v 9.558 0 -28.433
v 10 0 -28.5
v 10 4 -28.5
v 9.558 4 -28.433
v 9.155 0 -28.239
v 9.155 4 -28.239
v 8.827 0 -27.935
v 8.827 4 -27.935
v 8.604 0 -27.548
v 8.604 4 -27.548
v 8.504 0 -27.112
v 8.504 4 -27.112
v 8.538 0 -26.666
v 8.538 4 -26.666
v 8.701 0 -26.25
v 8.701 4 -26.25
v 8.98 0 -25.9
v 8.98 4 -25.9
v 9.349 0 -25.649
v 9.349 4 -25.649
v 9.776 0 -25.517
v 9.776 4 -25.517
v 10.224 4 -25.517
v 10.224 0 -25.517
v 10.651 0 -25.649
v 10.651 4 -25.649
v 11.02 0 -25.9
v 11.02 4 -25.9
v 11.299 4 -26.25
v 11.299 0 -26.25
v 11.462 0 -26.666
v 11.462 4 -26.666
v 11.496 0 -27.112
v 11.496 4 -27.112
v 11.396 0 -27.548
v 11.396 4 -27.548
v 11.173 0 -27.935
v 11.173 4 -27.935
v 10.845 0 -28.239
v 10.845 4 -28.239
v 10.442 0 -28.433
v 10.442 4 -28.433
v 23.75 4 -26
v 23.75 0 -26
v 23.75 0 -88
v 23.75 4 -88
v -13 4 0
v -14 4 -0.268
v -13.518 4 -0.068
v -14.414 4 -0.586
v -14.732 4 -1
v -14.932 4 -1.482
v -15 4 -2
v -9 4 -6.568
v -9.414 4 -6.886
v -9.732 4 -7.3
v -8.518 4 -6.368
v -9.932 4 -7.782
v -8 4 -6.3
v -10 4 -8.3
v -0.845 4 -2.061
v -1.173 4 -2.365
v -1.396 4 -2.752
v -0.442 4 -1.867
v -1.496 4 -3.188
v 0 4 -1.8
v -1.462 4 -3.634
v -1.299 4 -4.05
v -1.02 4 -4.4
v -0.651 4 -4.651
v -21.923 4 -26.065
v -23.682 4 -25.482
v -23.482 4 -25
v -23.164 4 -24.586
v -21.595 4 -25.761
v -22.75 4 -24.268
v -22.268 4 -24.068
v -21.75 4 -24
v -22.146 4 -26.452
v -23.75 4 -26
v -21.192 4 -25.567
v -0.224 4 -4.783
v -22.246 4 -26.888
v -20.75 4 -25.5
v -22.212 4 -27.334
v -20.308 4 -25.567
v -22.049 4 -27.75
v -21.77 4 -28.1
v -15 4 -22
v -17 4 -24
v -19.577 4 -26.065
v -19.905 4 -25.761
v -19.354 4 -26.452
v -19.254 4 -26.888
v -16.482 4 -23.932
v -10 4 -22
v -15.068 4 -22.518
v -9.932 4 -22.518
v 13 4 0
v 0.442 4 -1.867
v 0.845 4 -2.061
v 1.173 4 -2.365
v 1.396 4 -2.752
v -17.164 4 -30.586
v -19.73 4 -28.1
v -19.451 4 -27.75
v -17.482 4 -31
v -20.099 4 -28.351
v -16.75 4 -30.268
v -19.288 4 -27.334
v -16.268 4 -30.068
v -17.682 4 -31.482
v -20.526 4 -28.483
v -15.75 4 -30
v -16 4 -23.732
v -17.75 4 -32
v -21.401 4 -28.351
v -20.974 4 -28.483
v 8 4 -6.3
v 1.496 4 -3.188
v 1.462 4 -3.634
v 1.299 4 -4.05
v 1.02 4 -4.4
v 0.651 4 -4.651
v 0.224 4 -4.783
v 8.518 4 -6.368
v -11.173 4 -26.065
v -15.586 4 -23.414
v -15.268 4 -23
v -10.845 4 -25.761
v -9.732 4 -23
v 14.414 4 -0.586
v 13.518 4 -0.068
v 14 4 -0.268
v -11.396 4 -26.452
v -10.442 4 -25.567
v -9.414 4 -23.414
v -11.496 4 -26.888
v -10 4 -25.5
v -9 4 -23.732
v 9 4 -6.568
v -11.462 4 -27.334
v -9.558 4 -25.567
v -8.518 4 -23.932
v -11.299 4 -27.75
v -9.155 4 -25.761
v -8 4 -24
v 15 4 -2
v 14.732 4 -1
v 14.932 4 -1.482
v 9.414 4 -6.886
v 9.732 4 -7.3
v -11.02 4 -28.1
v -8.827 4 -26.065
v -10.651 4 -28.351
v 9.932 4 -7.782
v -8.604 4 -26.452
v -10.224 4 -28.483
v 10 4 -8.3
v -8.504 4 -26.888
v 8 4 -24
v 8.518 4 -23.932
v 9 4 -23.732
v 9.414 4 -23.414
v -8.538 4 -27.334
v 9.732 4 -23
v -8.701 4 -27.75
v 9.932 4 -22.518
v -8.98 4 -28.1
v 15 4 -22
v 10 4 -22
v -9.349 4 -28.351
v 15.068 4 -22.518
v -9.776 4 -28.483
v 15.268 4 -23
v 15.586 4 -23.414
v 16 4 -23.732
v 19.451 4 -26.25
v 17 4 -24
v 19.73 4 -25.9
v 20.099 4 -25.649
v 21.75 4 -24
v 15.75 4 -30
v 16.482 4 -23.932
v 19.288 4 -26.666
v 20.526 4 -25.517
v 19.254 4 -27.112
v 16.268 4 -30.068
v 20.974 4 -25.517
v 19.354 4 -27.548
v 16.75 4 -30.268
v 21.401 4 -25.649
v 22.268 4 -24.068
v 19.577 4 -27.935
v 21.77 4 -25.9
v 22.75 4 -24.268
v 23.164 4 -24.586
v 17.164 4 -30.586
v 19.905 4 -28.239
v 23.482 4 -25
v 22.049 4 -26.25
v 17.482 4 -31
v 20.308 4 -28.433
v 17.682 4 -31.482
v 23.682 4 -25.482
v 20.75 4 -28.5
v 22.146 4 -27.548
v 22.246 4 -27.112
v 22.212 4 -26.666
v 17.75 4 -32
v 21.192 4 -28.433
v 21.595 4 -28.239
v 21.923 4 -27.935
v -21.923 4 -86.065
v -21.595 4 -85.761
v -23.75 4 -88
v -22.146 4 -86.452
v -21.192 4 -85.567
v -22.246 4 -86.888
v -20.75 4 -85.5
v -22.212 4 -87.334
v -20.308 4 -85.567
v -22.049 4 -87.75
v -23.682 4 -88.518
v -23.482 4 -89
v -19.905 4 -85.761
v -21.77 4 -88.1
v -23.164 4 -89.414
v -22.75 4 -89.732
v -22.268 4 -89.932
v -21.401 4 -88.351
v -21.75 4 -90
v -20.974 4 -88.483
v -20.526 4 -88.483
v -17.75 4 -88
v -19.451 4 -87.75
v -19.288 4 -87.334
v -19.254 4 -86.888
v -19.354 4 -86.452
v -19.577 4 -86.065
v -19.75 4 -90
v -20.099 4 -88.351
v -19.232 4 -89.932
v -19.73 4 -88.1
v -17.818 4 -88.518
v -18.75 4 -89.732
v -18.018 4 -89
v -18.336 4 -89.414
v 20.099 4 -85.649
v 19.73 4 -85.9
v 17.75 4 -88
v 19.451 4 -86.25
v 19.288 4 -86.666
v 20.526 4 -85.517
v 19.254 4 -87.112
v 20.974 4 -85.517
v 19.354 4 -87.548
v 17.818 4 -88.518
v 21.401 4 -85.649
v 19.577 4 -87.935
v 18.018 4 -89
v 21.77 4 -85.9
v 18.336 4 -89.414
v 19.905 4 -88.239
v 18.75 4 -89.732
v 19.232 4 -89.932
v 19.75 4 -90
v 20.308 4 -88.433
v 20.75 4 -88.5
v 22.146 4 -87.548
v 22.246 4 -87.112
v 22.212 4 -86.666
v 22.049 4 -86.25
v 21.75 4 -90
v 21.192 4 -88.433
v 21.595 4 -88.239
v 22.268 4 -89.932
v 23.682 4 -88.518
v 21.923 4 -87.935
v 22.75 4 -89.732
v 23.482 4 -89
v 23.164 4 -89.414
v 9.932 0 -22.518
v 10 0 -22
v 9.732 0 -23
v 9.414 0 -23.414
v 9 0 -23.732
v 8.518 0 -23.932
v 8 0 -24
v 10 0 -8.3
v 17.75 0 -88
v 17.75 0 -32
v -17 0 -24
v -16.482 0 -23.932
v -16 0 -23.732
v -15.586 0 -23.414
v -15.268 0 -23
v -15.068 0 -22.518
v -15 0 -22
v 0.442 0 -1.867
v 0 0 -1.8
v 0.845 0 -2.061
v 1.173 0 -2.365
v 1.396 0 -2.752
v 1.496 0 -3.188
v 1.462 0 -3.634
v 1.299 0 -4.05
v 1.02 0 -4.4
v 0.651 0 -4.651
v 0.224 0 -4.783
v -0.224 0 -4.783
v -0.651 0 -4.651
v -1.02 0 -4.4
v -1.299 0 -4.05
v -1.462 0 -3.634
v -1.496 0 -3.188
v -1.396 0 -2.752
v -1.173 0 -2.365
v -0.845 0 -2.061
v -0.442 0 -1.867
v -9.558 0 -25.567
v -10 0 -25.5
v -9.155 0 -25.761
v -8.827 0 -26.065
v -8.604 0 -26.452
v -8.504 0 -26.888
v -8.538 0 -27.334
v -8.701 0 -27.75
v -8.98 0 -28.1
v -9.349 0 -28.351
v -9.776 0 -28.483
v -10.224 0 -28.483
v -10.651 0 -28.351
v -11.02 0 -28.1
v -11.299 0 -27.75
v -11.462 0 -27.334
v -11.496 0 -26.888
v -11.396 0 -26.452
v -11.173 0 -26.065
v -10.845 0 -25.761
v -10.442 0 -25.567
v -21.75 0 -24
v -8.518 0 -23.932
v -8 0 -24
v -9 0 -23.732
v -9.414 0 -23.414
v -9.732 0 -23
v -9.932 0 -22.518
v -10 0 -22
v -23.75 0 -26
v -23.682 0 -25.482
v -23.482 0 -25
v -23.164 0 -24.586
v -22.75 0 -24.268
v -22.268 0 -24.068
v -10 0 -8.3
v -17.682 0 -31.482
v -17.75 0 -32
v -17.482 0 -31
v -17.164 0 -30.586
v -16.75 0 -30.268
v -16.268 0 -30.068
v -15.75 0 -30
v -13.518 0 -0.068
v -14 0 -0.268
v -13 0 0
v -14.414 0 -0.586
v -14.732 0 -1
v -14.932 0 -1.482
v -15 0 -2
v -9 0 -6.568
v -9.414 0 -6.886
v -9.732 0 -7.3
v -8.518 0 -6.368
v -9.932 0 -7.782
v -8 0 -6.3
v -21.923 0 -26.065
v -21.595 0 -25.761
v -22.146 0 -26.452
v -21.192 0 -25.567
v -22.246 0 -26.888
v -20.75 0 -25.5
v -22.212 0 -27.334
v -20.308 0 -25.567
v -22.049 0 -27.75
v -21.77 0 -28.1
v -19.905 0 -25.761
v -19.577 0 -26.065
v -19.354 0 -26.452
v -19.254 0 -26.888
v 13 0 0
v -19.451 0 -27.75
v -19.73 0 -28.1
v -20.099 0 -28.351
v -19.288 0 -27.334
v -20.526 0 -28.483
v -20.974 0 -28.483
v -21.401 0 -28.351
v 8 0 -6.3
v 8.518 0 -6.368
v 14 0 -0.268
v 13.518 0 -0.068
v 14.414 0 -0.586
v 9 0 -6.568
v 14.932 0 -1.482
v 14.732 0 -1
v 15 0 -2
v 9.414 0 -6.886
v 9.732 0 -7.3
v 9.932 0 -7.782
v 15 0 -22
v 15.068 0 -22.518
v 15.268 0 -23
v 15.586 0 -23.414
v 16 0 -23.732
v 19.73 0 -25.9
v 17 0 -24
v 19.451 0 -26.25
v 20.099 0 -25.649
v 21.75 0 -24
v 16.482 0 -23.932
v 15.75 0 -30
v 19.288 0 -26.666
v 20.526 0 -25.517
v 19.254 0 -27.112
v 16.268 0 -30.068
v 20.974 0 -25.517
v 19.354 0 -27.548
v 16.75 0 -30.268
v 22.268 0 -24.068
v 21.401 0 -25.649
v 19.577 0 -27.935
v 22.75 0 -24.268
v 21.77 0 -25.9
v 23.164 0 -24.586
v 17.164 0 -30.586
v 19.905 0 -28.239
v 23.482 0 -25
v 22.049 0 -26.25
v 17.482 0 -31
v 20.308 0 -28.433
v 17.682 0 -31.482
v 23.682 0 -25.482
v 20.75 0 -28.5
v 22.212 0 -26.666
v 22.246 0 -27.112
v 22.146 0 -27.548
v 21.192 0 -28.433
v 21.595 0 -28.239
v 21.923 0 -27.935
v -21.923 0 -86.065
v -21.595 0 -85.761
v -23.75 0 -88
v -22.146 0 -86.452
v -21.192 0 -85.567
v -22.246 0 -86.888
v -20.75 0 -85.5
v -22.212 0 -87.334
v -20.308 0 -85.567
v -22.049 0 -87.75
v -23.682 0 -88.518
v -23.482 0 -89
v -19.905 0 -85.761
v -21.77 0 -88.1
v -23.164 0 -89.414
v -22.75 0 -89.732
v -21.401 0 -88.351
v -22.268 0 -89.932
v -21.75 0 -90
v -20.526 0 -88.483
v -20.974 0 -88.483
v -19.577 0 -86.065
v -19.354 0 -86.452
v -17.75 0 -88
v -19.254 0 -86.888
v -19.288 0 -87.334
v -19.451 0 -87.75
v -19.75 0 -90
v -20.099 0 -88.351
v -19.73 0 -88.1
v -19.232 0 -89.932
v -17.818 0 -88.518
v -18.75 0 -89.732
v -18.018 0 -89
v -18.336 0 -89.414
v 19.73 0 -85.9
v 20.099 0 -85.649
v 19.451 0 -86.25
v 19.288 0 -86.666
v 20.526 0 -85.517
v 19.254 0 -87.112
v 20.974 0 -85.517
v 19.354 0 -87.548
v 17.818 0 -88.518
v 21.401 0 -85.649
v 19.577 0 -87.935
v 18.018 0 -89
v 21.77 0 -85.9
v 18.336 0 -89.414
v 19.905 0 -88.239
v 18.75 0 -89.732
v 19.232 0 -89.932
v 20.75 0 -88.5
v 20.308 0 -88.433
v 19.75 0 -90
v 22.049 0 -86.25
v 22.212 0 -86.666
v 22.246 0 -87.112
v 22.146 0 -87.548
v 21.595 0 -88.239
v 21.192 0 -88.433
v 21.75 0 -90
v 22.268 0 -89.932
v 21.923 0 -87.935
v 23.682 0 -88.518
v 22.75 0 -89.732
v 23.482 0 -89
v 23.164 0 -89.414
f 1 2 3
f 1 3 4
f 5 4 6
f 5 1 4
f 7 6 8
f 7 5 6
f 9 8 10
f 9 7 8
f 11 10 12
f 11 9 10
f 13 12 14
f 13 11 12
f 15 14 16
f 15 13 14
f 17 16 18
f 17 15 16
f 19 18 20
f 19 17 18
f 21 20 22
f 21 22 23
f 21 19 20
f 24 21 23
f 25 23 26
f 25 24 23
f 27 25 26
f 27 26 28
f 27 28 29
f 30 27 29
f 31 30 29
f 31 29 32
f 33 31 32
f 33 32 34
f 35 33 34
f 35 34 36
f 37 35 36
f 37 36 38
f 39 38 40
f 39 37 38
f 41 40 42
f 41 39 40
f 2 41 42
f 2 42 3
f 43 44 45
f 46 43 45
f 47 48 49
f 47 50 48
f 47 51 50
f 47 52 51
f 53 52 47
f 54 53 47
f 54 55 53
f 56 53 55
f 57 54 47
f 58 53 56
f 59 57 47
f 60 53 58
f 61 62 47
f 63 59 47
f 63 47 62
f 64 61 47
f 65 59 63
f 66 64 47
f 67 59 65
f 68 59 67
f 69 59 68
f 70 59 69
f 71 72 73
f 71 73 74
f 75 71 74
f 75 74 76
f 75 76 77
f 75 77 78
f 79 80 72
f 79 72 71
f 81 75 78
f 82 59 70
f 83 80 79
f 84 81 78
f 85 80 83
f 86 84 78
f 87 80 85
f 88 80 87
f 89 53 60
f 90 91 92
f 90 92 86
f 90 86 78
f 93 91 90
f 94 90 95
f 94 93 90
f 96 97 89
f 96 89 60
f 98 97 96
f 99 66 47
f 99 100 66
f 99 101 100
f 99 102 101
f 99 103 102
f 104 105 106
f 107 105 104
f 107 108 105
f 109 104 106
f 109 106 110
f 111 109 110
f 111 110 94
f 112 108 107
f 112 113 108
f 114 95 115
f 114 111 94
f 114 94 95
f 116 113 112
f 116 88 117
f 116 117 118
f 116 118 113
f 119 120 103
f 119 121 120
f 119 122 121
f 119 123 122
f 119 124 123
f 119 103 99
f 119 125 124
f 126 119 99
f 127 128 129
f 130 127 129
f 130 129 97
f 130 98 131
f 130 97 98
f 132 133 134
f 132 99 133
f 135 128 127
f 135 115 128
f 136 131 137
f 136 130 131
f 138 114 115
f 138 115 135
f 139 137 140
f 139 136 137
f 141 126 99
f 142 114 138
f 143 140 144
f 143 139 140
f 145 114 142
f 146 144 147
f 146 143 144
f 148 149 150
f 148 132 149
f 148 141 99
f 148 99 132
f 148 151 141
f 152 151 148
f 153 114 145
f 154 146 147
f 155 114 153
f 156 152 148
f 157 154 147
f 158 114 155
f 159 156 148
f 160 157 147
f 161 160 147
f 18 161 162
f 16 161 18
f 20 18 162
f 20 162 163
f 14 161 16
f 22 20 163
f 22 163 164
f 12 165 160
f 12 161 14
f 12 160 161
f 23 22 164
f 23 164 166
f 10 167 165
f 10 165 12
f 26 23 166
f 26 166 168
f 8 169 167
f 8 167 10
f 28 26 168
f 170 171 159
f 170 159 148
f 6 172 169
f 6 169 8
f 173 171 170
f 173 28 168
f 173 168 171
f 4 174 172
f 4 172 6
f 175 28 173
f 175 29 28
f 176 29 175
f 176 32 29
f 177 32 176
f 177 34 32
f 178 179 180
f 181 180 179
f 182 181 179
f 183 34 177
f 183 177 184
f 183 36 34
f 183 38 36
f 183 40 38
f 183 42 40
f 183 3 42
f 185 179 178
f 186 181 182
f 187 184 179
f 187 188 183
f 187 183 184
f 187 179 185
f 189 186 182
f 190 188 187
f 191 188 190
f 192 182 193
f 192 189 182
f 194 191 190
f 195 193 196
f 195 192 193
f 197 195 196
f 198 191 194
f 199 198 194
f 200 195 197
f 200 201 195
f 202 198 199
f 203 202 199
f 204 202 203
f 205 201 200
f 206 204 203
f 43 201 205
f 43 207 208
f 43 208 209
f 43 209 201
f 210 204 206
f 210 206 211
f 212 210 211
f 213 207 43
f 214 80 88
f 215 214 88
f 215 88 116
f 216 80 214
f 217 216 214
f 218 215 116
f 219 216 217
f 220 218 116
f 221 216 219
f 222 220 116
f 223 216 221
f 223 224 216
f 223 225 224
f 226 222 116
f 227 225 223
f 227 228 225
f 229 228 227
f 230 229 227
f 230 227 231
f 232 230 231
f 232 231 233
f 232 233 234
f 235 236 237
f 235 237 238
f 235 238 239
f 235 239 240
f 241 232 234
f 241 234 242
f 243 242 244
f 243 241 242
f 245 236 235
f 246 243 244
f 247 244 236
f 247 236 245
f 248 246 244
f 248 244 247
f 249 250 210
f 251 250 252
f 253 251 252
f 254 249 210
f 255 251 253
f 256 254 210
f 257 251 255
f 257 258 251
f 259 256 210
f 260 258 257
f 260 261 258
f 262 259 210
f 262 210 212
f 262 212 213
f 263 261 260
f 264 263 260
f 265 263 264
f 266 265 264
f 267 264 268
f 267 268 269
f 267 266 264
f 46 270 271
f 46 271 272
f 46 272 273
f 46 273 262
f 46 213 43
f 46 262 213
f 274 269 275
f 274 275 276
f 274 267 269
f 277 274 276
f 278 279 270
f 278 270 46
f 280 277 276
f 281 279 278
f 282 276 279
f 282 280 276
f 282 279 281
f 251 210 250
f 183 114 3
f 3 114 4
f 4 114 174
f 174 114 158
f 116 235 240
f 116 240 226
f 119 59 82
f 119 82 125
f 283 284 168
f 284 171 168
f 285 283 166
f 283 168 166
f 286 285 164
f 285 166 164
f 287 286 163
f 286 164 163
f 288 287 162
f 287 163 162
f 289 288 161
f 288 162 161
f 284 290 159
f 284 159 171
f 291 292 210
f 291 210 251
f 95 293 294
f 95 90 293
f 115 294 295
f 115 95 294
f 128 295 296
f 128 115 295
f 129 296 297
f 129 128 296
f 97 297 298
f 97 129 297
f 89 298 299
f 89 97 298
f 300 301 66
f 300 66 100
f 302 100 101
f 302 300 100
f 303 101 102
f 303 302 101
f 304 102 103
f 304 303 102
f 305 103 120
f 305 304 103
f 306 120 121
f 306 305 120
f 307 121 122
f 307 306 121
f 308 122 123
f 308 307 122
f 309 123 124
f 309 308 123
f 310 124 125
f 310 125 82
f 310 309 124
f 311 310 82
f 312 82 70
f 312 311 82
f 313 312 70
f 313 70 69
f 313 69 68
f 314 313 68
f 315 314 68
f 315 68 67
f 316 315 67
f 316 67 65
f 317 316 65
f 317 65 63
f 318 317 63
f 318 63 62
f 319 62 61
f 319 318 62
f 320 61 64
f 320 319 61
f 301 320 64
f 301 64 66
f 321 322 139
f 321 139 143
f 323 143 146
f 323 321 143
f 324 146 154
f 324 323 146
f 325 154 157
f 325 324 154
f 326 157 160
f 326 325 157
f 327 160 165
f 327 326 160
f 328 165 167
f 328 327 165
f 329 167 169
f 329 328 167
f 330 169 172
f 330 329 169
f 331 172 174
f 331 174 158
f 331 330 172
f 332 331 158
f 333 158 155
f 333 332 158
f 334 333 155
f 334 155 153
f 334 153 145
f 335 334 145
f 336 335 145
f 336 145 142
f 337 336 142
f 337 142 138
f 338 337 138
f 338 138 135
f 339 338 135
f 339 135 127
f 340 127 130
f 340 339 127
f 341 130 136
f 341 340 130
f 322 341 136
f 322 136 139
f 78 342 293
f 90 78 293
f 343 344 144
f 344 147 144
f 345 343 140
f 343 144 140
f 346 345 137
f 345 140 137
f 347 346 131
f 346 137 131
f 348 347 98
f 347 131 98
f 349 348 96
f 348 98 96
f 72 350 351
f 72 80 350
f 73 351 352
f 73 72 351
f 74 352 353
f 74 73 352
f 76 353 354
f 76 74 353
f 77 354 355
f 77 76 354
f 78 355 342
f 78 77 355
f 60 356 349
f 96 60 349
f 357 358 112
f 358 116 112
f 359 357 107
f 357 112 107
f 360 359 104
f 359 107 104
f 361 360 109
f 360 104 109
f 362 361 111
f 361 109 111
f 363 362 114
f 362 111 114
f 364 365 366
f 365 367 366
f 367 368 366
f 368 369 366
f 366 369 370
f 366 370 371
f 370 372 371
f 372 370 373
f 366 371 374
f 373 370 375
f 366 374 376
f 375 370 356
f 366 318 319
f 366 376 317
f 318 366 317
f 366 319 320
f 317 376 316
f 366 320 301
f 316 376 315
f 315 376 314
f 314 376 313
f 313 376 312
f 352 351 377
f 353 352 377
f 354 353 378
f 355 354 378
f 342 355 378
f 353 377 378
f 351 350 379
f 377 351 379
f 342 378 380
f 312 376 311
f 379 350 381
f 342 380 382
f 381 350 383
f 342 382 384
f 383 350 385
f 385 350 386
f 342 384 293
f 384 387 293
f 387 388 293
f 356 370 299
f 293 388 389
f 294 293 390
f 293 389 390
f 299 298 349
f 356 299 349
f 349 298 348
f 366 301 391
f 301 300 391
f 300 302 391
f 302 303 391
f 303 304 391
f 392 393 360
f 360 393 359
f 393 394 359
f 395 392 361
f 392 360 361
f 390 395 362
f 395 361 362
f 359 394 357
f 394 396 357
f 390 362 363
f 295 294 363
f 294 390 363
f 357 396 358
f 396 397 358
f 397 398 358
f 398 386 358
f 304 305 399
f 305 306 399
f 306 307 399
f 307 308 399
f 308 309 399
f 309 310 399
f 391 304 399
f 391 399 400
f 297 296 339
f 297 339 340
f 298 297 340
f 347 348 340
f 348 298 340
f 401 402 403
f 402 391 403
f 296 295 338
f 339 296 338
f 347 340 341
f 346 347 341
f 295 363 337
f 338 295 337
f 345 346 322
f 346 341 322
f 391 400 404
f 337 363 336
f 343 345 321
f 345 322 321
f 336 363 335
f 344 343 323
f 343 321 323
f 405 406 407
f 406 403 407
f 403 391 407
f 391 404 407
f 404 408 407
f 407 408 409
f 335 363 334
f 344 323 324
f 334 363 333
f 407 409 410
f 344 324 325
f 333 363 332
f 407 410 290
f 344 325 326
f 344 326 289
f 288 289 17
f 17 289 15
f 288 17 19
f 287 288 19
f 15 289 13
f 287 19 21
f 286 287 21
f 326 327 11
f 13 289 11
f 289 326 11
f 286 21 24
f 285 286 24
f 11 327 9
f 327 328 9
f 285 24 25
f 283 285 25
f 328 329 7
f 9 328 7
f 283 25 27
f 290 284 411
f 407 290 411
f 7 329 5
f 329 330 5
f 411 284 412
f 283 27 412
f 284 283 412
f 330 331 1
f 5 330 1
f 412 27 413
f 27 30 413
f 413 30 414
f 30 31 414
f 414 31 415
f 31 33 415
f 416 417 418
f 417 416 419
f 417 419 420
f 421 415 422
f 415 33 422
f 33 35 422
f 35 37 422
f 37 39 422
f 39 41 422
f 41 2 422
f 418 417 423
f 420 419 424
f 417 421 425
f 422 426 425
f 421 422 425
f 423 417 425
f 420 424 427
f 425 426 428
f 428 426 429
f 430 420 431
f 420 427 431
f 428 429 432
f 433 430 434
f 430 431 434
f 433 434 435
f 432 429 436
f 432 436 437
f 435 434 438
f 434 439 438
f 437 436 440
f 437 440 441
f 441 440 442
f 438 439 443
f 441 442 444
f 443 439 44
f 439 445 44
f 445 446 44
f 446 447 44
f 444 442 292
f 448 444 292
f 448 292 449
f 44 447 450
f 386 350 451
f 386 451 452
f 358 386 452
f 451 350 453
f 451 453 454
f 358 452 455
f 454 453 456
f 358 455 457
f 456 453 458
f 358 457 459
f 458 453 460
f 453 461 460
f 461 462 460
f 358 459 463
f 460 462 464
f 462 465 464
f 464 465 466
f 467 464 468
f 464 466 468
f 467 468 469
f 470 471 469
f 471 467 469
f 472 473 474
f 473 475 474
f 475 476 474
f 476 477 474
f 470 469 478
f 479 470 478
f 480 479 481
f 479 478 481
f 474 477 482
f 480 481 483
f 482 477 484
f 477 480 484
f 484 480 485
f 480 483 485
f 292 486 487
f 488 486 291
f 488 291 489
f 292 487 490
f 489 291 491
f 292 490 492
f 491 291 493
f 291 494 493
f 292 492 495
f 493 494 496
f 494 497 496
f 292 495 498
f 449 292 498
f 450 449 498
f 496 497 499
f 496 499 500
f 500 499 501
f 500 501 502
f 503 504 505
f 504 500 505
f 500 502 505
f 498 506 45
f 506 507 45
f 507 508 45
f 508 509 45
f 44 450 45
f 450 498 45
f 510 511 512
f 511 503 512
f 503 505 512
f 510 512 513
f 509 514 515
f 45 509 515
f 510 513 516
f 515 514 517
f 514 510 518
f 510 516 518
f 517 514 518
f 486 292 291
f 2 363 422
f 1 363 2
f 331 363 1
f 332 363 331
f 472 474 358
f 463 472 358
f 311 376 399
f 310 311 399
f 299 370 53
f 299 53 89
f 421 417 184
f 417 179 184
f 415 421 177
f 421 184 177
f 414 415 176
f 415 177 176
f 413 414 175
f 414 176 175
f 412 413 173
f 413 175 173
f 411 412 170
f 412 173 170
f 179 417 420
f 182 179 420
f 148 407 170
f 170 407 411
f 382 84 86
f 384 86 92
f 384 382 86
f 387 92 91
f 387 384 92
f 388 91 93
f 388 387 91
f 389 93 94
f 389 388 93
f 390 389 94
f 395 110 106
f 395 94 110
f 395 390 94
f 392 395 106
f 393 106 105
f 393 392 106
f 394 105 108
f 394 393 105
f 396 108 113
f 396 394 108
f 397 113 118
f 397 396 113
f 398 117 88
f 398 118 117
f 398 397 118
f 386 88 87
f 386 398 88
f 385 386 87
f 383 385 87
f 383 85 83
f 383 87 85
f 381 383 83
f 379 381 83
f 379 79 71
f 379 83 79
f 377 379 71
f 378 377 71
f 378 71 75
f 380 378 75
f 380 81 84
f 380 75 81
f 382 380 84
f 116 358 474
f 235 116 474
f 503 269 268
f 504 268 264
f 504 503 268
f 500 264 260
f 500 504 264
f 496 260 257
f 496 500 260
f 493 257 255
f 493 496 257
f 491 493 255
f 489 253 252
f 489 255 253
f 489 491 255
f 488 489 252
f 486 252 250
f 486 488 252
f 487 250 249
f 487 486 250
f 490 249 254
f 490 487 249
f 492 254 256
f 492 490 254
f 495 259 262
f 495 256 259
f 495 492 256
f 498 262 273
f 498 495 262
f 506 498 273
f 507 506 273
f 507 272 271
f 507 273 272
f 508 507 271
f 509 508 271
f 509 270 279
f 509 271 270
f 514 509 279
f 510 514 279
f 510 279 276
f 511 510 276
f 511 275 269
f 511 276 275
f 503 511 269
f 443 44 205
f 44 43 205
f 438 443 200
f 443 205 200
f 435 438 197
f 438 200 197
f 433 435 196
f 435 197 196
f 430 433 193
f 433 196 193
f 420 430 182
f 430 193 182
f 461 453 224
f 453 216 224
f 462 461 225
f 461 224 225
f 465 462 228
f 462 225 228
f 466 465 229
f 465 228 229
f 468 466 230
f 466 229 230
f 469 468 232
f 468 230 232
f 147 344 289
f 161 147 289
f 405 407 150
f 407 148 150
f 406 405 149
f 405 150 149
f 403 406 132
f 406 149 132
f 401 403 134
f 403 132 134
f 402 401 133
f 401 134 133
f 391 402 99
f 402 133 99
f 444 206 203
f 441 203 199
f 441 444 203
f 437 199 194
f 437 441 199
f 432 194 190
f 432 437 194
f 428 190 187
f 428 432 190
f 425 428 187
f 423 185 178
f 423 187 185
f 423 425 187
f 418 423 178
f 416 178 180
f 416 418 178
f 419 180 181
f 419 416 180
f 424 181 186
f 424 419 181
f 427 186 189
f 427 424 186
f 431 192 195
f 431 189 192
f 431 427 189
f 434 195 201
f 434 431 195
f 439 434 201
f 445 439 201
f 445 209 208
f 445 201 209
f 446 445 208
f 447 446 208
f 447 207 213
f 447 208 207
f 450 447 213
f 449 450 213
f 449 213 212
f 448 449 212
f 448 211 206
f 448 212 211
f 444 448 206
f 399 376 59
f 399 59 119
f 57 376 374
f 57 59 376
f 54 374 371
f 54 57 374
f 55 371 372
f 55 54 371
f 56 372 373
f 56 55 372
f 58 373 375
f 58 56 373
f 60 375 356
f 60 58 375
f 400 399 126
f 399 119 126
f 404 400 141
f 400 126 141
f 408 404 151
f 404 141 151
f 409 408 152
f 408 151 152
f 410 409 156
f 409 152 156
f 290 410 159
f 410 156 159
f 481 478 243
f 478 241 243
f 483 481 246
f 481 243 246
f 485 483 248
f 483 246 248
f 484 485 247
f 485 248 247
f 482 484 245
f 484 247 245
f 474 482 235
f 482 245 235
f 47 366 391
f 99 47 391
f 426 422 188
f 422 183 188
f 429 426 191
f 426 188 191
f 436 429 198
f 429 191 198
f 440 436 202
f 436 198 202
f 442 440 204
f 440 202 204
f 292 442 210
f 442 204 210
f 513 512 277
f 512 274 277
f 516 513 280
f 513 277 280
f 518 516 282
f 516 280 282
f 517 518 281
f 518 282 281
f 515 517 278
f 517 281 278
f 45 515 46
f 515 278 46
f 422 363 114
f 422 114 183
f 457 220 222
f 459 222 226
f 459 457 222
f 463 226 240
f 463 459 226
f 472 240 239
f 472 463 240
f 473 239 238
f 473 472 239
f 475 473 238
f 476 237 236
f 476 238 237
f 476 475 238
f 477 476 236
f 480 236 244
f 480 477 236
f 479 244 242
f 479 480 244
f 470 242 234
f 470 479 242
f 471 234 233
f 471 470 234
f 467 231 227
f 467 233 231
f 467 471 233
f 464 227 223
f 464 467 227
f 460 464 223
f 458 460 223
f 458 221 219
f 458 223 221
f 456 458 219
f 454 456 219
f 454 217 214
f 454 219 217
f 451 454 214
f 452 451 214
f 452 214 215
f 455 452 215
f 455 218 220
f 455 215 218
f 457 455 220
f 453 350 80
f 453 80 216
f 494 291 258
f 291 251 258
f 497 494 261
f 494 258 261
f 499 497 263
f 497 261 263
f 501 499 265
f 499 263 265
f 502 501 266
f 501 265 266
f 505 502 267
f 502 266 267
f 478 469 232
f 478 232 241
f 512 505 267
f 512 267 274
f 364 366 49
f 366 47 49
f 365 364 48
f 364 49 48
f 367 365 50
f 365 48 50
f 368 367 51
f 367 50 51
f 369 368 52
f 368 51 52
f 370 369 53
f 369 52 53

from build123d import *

# Parameters (mm, degrees)
SKETCH_1_W          = 47.5
SKETCH_1_H          = 90
SKETCH_1_R          = 1.5
EXTRUDE_1_DEPTH     = 4
SKETCH_2_R          = 1.5
SKETCH_2_W          = 35.5
SKETCH_2_H          = 60
SKETCH_2_W_2        = 8.75
SKETCH_2_H_2        = 24
SKETCH_2_W_3        = 20
SKETCH_2_H_3        = 17.7
CUT_EXTRUDE_2_DEPTH = 94.166853011
FILLET_1_R          = 2


with BuildPart() as part:
    # 草图1 → 凸台-拉伸1 (new body)
    with BuildSketch(Plane(origin=(0, 0, 0), x_dir=(1, 0, 0), z_dir=(0, 1, 0))):
        with Locations((0, 45)):
            Rectangle(SKETCH_1_W, SKETCH_1_H)
        with Locations(Location((-10, 27, 0), (0, 0, 270))):
            Circle(SKETCH_1_R, mode=Mode.SUBTRACT)
        with Locations(Location((0, 3.3, 0), (0, 0, 270))):
            Circle(SKETCH_1_R, mode=Mode.SUBTRACT)
        with Locations(Location((10, 27, 0), (0, 0, 90))):
            Circle(SKETCH_1_R, mode=Mode.SUBTRACT)
    extrude(amount=EXTRUDE_1_DEPTH)

    # 草图2 → 切除-拉伸2 (cut, through all)
    with BuildSketch(Plane(origin=(0, 0, 0), x_dir=(1, 0, 0), z_dir=(0, 1, 0))):
        with Locations(Location((-20.75, 87, 0), (0, 0, 270))):
            Circle(SKETCH_2_R)
        with Locations(Location((20.75, 87, 0), (0, 0, 90))):
            Circle(SKETCH_2_R)
        with Locations(Location((-20.75, 27, 0), (0, 0, 270))):
            Circle(SKETCH_2_R)
        with Locations(Location((20.75, 27, 0), (0, 0, 90))):
            Circle(SKETCH_2_R)
        with Locations((0, 60)):
            Rectangle(SKETCH_2_W, SKETCH_2_H)
        with Locations((-19.375, 12)):
            Rectangle(SKETCH_2_W_2, SKETCH_2_H_2)
        with Locations((19.375, 12)):
            Rectangle(SKETCH_2_W_2, SKETCH_2_H_2)
        with Locations((0, 15.15)):
            Rectangle(SKETCH_2_W_3, SKETCH_2_H_3)
    extrude(amount=CUT_EXTRUDE_2_DEPTH, mode=Mode.SUBTRACT)

    # 圆角1
    fillet_1_edges = [part.edges().sort_by_distance(p)[0] for p in [
        (-23.75, 2, -24),
        (-15, 2, 0),
        (-15, 2, -24),
        (-10, 2, -24),
        (-10, 2, -6.3),
        (10, 2, -6.3),
        (10, 2, -24),
        (23.75, 2, -24),
        (15, 2, -24),
        (15, 2, 0),
        (-17.75, 2, -90),
        (-17.75, 2, -30),
        (17.75, 2, -30),
        (17.75, 2, -90),
        (-23.75, 2, -90),
        (23.75, 2, -90),
    ]]
    fillet(fillet_1_edges, radius=FILLET_1_R)


solid = part.part
